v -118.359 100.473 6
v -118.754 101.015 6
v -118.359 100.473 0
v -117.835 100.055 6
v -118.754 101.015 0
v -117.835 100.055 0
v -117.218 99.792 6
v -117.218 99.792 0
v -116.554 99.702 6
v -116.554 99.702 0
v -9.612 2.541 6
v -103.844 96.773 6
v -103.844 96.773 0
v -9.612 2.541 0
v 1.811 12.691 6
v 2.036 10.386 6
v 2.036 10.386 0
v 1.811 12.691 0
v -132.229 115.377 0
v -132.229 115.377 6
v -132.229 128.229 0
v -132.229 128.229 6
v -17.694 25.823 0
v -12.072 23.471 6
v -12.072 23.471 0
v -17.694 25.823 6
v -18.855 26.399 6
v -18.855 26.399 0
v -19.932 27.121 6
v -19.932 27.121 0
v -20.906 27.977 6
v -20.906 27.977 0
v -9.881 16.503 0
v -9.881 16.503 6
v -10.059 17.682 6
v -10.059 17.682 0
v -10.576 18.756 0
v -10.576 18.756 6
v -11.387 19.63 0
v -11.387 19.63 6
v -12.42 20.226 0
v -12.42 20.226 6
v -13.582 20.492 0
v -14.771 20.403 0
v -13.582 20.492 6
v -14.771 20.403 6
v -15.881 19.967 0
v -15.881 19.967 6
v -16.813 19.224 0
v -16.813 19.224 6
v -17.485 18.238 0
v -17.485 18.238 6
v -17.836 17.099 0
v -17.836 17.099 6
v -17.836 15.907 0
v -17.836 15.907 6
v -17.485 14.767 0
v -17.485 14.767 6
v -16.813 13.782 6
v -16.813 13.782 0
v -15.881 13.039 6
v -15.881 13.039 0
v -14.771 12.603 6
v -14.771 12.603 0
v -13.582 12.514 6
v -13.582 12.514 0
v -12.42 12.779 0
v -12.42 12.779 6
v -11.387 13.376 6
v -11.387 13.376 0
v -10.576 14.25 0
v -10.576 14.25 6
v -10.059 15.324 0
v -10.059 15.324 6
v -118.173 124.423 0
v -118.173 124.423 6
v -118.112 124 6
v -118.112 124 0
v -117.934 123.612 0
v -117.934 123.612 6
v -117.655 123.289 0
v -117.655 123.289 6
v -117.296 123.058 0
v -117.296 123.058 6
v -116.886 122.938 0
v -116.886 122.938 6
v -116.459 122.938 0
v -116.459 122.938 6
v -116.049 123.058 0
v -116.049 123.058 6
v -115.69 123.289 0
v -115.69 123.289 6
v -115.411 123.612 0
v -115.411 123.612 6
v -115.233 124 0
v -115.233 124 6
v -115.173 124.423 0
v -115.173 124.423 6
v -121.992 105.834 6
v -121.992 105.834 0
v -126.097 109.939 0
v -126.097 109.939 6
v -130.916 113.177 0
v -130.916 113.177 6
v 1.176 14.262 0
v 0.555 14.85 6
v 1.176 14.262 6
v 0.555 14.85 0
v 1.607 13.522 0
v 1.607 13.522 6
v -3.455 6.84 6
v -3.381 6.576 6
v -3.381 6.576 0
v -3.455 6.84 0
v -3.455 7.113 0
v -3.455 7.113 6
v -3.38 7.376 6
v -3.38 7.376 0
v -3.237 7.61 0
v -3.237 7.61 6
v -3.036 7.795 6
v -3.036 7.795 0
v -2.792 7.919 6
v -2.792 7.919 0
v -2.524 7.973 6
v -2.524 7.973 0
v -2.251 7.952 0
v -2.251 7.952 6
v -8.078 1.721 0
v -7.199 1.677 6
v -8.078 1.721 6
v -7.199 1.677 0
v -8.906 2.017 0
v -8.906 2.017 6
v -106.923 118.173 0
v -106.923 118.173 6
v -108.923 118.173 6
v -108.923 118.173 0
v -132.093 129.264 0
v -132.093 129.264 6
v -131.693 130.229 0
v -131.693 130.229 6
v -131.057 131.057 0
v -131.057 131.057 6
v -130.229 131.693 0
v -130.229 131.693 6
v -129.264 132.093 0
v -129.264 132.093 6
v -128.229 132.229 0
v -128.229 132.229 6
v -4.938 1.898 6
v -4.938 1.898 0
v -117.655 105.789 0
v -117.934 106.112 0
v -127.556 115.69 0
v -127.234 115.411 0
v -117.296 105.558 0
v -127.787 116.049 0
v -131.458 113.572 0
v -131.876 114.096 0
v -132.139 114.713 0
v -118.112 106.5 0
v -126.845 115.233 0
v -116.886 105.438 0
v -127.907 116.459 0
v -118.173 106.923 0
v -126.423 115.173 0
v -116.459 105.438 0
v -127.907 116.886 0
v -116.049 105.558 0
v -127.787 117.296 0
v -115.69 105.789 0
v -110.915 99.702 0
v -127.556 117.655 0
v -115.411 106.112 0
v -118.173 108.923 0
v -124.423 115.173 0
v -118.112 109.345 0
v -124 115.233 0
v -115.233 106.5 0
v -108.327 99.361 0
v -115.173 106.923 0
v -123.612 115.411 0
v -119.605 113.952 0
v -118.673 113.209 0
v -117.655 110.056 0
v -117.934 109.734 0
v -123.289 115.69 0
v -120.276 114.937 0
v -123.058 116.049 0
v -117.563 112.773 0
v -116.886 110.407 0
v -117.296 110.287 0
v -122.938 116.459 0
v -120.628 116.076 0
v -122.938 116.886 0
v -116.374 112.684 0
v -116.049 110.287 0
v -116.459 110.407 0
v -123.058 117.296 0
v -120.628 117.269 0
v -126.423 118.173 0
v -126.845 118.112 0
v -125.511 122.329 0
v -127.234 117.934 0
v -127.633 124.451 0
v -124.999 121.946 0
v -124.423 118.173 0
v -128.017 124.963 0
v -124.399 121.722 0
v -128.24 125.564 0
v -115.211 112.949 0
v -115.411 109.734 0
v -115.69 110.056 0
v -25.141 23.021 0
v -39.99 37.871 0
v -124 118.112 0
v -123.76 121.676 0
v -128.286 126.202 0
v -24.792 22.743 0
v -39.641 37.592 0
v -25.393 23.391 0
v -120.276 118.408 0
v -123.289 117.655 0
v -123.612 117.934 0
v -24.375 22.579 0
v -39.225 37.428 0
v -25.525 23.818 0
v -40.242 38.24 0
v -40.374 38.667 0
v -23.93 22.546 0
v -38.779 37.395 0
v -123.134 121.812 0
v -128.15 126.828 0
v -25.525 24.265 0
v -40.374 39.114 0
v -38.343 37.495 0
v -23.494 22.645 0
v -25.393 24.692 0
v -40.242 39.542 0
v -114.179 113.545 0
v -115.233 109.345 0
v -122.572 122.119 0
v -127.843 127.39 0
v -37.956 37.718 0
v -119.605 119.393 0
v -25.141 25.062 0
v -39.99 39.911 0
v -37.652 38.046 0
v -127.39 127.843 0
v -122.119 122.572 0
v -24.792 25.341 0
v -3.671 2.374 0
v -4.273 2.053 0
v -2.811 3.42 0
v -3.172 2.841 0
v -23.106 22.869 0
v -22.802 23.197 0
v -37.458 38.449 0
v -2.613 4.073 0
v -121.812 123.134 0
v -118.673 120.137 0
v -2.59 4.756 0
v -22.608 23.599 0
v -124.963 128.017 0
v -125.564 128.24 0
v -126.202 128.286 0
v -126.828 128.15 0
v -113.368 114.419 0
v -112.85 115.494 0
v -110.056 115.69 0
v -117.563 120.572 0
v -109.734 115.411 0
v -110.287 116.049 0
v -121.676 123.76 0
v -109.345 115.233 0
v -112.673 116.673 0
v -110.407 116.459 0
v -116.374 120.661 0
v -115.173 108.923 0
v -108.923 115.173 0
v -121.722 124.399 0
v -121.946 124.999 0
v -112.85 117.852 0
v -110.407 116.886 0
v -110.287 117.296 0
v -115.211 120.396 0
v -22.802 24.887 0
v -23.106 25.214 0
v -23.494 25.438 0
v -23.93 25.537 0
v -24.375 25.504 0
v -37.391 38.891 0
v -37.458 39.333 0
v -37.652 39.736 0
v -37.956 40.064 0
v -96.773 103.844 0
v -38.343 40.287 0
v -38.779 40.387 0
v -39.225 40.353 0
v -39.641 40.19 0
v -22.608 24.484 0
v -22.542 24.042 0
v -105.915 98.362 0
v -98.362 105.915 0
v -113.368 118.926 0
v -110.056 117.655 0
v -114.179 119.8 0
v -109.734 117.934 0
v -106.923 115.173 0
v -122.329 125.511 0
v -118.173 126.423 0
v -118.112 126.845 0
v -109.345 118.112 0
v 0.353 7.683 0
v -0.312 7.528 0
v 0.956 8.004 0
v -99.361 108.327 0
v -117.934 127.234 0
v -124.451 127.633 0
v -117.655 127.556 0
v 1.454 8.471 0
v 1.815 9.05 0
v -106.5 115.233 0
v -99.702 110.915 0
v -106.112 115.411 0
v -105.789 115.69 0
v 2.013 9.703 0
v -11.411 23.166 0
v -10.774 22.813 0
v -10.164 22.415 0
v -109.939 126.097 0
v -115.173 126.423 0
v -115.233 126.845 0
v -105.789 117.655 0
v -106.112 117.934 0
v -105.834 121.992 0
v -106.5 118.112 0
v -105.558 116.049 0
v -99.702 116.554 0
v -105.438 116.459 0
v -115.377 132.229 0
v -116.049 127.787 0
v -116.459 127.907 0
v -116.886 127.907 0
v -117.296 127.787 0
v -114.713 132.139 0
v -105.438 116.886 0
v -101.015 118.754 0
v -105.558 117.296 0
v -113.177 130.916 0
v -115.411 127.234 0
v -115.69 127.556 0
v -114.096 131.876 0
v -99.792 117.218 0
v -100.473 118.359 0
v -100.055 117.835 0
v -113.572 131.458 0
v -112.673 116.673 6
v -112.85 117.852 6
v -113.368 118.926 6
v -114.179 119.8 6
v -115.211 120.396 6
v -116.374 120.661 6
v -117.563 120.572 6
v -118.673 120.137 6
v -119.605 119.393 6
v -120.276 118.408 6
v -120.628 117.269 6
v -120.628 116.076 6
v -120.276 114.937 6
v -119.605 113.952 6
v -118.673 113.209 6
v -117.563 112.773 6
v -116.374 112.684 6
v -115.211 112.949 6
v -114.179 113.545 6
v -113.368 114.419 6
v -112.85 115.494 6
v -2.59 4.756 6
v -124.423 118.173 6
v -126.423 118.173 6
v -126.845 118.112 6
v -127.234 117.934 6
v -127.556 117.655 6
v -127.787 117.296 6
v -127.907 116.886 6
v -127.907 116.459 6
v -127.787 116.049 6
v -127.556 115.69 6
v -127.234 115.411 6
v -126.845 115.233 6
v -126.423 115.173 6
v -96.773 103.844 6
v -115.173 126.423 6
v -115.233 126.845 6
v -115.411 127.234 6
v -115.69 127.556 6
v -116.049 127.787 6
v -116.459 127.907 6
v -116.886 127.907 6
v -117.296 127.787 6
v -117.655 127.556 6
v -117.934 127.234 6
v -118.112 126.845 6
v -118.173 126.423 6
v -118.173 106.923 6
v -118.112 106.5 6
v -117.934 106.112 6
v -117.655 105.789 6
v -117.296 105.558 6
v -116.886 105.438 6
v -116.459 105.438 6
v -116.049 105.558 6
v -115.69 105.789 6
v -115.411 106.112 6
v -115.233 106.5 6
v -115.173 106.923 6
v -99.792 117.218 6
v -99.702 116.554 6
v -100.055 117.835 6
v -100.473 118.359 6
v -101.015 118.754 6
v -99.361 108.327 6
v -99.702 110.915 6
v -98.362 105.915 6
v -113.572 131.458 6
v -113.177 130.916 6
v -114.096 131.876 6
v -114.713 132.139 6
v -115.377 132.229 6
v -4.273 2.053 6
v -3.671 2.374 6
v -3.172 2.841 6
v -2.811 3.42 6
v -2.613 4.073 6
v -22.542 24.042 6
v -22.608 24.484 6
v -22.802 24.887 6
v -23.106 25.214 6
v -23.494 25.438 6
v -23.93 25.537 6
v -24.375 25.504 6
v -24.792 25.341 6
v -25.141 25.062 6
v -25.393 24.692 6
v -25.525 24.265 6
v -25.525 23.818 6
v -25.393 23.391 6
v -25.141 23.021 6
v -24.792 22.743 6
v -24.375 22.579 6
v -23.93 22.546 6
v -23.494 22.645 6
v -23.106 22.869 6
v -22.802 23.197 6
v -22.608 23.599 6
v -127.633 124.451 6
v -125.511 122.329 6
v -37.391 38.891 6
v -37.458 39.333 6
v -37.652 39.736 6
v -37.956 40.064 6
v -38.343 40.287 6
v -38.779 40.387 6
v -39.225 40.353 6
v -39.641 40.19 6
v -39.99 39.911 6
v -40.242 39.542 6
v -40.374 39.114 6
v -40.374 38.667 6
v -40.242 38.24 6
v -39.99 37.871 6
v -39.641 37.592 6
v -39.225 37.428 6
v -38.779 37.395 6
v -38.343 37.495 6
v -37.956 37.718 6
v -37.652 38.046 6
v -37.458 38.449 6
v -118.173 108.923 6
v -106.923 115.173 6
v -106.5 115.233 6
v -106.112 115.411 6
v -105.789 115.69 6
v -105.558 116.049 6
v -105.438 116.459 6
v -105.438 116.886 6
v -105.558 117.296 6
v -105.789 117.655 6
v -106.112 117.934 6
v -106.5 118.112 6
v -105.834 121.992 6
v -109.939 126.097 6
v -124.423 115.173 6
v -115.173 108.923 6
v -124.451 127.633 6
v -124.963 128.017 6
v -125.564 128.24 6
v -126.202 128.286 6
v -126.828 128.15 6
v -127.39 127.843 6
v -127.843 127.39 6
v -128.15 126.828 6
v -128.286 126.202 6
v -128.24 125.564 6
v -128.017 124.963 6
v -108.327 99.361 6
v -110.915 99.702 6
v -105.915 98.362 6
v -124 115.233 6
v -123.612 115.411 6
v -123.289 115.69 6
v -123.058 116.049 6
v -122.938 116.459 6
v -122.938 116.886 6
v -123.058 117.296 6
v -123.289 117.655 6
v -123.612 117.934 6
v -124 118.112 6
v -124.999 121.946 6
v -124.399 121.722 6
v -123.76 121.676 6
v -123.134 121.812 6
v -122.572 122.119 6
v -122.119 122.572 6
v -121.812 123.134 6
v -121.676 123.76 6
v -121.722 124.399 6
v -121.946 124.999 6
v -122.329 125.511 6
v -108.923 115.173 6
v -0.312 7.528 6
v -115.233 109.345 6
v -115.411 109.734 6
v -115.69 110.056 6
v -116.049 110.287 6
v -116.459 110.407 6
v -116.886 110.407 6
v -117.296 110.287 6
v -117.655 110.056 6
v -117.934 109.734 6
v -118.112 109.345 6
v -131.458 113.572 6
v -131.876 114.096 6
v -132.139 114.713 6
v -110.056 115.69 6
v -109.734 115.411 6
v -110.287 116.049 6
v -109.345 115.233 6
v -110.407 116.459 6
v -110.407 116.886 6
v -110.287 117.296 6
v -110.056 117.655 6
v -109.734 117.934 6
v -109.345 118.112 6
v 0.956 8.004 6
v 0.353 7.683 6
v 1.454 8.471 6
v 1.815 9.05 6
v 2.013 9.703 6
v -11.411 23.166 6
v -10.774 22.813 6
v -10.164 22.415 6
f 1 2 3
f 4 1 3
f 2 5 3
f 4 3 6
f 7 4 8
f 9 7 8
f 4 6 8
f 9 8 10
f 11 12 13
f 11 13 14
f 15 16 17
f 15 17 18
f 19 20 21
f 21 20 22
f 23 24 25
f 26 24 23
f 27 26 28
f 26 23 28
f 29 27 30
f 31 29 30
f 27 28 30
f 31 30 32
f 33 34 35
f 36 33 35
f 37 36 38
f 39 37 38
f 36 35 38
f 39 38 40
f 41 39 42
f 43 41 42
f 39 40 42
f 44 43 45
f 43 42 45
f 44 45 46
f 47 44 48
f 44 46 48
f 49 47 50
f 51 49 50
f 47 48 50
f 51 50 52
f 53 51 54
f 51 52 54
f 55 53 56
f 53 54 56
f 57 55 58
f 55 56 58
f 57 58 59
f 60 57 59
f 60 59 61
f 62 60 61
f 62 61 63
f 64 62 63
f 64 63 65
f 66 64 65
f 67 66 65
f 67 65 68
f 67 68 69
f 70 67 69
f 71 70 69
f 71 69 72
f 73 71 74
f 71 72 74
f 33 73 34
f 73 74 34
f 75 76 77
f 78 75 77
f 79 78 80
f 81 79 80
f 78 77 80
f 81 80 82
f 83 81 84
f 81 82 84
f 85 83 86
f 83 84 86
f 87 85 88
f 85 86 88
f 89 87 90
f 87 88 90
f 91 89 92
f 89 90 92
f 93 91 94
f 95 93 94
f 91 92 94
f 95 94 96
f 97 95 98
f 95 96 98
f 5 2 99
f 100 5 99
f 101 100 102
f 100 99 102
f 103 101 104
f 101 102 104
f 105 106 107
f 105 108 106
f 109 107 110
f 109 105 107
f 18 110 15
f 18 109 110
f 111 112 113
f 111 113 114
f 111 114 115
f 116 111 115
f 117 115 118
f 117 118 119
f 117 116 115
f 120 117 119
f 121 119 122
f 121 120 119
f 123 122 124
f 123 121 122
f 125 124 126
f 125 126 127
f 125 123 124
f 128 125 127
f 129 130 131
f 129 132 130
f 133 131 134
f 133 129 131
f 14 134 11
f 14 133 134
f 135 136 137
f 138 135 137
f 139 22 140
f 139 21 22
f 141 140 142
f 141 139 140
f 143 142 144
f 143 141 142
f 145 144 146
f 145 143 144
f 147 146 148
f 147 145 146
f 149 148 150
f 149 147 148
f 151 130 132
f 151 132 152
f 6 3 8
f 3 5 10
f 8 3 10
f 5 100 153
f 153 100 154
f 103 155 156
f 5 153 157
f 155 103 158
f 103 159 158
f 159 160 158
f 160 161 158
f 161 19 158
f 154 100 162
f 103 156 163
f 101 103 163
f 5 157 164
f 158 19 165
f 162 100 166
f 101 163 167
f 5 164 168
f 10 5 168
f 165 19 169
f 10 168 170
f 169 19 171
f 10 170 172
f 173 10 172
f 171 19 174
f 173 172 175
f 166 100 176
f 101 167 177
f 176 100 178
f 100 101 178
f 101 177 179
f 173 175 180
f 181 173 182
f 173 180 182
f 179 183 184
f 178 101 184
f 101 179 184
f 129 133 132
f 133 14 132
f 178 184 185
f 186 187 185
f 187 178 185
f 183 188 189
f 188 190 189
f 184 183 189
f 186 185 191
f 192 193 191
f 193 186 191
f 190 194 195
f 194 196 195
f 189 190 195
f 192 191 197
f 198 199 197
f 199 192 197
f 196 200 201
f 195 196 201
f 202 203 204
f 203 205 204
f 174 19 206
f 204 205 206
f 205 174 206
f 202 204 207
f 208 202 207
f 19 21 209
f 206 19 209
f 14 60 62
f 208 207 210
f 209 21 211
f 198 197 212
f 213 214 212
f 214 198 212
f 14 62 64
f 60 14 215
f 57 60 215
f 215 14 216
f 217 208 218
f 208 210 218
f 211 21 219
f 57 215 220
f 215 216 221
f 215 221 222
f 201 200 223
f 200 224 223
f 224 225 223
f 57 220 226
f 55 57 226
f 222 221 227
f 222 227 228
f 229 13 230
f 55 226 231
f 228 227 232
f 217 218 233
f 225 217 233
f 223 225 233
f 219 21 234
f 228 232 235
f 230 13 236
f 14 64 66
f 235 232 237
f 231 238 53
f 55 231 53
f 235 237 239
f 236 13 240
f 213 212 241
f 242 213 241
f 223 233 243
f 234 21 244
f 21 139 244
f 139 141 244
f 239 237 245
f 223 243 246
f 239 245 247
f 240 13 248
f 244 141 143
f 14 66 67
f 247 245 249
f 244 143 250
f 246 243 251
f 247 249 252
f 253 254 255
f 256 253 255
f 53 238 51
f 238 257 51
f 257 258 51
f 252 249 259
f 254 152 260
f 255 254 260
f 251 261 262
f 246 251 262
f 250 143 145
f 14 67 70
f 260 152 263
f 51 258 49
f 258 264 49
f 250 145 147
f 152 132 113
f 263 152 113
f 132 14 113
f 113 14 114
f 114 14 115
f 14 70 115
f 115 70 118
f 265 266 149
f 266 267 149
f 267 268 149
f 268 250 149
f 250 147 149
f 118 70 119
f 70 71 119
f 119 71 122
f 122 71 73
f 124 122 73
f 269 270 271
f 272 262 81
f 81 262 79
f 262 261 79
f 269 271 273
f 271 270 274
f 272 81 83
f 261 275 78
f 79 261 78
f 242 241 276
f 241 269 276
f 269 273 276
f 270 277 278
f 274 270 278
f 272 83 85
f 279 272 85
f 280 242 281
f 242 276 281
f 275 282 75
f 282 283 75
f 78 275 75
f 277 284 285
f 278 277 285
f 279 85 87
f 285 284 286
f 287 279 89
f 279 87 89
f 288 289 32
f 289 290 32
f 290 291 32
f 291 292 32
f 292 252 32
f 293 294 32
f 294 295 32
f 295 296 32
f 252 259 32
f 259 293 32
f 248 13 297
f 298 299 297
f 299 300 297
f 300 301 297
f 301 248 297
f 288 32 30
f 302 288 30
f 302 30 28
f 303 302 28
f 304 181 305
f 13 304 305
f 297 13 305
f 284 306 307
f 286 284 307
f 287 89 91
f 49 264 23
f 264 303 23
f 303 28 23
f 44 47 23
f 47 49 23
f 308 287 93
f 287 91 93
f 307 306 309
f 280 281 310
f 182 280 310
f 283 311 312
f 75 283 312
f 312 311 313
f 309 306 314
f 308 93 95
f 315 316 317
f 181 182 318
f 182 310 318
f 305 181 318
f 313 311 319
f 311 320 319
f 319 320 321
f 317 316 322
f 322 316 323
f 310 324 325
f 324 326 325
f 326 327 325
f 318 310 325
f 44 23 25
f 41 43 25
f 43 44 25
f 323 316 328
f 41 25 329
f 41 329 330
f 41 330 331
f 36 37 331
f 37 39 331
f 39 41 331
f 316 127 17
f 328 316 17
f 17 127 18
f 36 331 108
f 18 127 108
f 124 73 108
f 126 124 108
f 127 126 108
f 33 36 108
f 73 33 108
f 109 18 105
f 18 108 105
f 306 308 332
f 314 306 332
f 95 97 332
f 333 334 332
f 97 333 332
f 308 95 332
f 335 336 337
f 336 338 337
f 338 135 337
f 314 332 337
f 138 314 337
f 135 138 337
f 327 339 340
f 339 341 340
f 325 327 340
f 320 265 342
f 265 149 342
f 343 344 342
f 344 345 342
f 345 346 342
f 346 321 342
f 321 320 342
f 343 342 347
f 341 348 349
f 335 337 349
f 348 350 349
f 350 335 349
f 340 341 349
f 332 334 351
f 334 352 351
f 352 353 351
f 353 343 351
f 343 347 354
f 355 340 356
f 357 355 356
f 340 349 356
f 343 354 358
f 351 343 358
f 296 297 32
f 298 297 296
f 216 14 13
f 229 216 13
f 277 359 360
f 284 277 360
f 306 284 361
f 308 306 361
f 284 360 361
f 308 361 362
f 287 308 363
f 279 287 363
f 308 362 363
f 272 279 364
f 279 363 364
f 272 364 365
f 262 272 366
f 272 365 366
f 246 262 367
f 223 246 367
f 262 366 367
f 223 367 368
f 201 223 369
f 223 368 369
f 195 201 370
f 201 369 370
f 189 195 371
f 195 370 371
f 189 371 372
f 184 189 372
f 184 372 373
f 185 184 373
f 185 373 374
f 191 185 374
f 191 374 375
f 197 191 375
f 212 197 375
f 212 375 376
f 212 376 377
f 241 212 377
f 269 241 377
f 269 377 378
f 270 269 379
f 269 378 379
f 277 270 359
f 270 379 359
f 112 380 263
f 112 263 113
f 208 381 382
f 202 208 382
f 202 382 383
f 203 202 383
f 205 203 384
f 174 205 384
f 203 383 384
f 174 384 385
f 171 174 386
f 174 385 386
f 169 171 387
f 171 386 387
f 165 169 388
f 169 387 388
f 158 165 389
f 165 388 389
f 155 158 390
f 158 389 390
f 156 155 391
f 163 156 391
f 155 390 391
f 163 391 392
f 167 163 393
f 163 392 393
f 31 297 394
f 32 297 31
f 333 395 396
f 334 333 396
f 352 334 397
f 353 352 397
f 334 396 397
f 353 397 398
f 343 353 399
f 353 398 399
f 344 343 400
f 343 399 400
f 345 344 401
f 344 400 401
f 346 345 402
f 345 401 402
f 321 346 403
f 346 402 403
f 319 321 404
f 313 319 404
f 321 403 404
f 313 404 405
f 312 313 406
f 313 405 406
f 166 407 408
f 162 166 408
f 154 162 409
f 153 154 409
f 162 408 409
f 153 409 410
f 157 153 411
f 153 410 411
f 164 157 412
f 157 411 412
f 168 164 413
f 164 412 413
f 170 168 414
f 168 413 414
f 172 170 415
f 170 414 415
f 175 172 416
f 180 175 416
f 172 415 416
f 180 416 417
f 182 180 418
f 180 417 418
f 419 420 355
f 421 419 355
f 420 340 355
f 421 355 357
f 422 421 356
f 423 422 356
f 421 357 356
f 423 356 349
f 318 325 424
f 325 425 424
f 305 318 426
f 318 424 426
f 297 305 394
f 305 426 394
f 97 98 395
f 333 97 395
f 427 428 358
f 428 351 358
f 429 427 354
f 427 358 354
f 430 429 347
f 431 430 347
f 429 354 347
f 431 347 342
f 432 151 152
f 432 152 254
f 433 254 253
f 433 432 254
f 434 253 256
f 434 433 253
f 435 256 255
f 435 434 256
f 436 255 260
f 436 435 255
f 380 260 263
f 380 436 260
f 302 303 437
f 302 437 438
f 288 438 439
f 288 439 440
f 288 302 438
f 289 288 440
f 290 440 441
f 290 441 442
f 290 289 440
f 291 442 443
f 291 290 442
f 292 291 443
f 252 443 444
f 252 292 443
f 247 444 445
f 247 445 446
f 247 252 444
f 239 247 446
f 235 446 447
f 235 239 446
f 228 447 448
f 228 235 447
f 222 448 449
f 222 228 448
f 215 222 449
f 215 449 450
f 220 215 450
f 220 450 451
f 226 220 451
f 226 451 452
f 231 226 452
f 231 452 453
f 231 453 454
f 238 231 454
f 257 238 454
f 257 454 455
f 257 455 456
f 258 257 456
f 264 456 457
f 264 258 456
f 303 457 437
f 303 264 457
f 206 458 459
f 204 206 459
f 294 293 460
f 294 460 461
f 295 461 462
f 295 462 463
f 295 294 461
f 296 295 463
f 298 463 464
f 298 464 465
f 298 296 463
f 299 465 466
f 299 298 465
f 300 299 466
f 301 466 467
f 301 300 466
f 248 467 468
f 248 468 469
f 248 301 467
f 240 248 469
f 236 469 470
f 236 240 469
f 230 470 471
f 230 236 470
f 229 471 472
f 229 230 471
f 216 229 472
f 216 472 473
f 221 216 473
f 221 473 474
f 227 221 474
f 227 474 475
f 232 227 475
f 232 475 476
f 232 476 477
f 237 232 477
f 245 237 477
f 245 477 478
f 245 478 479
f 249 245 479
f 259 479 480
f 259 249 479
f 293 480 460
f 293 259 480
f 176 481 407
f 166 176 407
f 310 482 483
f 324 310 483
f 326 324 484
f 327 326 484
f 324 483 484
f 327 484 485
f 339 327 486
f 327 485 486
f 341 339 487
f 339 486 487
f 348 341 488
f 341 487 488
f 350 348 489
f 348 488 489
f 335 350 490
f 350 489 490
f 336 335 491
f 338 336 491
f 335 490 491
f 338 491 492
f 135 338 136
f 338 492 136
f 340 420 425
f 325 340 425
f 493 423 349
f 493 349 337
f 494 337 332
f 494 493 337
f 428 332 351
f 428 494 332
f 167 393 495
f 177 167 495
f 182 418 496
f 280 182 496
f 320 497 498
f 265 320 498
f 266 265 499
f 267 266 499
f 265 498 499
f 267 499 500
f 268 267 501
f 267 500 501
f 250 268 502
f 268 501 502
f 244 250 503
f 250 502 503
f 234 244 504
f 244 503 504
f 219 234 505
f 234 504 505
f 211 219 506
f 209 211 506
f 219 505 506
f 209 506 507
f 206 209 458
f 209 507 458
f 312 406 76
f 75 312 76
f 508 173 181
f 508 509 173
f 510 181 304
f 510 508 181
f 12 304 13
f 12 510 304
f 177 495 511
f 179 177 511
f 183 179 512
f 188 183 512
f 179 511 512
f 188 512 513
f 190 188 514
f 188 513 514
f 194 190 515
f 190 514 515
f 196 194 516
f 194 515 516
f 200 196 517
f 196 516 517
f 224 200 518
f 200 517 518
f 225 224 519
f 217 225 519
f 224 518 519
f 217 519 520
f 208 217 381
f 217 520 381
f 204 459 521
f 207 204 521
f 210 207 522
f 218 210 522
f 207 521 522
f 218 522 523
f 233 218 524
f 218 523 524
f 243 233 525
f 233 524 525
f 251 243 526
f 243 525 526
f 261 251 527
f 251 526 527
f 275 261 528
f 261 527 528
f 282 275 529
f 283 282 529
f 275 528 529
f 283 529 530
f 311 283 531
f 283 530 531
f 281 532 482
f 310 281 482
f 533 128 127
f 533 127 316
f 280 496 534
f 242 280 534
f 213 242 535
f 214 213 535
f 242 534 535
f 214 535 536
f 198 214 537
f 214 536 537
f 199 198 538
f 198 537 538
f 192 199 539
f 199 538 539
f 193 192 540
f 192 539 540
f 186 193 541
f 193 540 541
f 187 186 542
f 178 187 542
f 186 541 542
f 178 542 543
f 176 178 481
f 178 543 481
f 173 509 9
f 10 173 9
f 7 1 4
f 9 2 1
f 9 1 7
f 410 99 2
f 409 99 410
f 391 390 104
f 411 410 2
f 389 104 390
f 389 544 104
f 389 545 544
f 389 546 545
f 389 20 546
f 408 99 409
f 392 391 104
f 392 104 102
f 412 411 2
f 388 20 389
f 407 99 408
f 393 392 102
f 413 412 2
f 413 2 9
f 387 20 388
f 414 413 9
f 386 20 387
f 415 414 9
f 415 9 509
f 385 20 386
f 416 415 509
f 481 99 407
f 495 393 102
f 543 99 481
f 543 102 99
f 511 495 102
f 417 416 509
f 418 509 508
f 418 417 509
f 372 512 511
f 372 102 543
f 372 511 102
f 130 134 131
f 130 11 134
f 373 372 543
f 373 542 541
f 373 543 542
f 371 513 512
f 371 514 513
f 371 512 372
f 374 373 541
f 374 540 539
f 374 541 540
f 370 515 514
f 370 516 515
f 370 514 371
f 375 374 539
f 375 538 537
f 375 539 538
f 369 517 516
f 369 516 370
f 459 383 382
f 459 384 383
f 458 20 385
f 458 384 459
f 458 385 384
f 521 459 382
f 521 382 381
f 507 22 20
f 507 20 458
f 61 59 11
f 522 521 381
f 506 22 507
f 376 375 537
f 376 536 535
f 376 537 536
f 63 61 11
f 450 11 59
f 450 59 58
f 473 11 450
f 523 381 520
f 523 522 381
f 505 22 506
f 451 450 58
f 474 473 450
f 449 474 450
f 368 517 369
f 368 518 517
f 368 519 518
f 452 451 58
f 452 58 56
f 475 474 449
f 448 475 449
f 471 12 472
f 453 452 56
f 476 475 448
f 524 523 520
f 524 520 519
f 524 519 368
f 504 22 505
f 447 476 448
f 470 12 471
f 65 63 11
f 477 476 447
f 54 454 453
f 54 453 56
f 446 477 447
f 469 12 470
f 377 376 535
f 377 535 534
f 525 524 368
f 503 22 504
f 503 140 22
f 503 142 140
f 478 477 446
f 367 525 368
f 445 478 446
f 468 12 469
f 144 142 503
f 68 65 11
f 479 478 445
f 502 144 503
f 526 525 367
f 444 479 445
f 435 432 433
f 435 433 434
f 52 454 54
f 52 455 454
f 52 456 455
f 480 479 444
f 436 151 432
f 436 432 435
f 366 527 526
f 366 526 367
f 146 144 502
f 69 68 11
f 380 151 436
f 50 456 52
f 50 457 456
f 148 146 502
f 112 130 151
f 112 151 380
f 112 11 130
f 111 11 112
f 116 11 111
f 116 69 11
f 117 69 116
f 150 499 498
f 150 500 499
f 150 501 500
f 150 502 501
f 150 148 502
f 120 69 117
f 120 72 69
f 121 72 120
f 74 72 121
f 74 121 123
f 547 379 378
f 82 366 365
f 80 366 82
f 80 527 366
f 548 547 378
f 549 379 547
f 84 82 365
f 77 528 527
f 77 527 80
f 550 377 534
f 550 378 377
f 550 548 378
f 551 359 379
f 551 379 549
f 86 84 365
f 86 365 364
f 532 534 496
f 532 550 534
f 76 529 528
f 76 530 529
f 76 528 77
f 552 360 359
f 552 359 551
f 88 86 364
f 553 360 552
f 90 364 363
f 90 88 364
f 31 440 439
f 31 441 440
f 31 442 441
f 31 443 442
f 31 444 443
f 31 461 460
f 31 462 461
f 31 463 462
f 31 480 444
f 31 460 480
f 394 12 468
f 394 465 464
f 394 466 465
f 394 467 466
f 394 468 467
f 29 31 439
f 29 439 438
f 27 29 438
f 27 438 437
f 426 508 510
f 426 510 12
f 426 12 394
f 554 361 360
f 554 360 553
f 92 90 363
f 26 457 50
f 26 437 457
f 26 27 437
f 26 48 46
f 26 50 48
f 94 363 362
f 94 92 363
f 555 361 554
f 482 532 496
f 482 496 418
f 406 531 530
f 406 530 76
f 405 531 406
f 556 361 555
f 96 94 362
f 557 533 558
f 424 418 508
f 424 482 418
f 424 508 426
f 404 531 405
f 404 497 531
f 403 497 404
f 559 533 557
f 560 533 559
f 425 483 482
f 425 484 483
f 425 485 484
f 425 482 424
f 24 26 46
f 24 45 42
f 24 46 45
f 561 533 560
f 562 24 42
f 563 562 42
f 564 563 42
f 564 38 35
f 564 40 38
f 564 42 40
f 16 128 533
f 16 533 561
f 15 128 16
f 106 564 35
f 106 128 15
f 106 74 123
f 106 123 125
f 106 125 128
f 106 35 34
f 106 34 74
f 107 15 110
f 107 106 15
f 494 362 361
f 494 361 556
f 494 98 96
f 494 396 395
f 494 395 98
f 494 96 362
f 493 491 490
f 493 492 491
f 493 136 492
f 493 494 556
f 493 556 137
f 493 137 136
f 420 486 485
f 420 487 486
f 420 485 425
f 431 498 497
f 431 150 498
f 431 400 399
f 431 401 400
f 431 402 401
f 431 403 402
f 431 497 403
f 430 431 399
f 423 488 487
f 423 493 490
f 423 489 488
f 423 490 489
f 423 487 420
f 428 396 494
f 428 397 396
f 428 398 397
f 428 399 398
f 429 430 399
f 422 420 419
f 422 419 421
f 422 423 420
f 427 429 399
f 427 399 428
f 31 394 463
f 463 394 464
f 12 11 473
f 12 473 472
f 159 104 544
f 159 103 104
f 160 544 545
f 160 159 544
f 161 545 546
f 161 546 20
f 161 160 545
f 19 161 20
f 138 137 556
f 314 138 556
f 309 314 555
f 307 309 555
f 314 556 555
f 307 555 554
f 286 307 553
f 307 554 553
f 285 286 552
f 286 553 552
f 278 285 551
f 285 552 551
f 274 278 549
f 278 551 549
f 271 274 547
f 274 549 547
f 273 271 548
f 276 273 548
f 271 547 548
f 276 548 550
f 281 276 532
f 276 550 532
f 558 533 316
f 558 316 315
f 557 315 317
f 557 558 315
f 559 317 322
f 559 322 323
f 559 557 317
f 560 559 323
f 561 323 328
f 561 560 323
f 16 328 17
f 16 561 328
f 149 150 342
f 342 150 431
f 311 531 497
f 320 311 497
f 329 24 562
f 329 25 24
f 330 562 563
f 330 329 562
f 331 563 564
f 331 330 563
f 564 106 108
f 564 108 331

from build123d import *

# Parameters (mm, degrees)
CROQUIS1_R              = 1.5
CROQUIS1_R_2            = 4
SALIENTE_EXTRUIR1_DEPTH = 6
CROQUIS4_R              = 4
SALIENTE_EXTRUIR3_DEPTH = 6
CORTAR_EXTRUIR1_DEPTH   = 6
REDONDEO3_R             = 4
CORTAR_EXTRUIR2_DEPTH   = 6
REDONDEO4_R             = 2.5
REDONDEO6_R             = 10
CORTAR_EXTRUIR3_START   = -6
CROQUIS9_R              = 4
CORTAR_EXTRUIR3_DEPTH   = 6
CROQUIS15_R             = 4
SALIENTE_EXTRUIR4_DEPTH = 6
REDONDEO12_R            = 10
REDONDEO13_R            = 3


with BuildPart() as part:
    # Croquis1 → Saliente-Extruir1 (new body)
    with BuildSketch(Plane.XY):
        with BuildLine():
            Line((-17.112213819, 2.294275414), (-30.516043414, 23.123582692))
            ThreePointArc((-30.516043414, 23.123582692), (-31.14080226, 23.989156666), (-31.854269143, 24.783201331))
            Line((-31.854269143, 24.783201331), (-45.961940777, 38.890872965))
            Line((-45.961940777, 38.890872965), (-106.773123959, 99.702056147))
            Line((-106.773123959, 99.702056147), (-99.702056147, 106.773123959))
            Line((-99.702056147, 106.773123959), (-38.890872965, 45.961940777))
            Line((-38.890872965, 45.961940777), (-24.783201331, 31.854269143))
            ThreePointArc((-24.783201331, 31.854269143), (-23.989156666, 31.14080226), (-23.123582692, 30.516043414))
            Line((-23.123582692, 30.516043414), (-2.294275414, 17.112213819))
            ThreePointArc((-2.294275414, 17.112213819), (-0.610887166, 15.302496804), (0, 12.907567049))
            Line((0, 12.907567049), (0, 7.055686841))
            ThreePointArc((0, 7.055686841), (-0.823113423, 5.438609853), (-2.614937985, 5.15257064))
            Line((-2.614937985, 5.15257064), (-4.503911831, 5.762938925))
            ThreePointArc((-4.503911831, 5.762938925), (-5.518487605, 5.518487605), (-5.762938925, 4.503911831))
            Line((-5.762938925, 4.503911831), (-5.15257064, 2.614937985))
            ThreePointArc((-5.15257064, 2.614937985), (-5.438609853, 0.823113423), (-7.055686841, 0))
            Line((-7.055686841, 0), (-12.907567049, 0))
            ThreePointArc((-12.907567049, 0), (-15.302496804, 0.610887166), (-17.112213819, 2.294275414))
        make_face()
        with Locations((-38.890872965, 38.890872965)):
            Circle(CROQUIS1_R, mode=Mode.SUBTRACT)
        with Locations((-24.04163056, 24.04163056)):
            Circle(CROQUIS1_R, mode=Mode.SUBTRACT)
        with Locations((-15.25, 15.25)):
            Circle(CROQUIS1_R_2, mode=Mode.SUBTRACT)
    extrude(amount=SALIENTE_EXTRUIR1_DEPTH)

    # Croquis4 → Saliente-Extruir3 (add)
    with BuildSketch(Plane.XY.offset(6)):
        Polygon((-106.773123959, 99.702056147), (-118.086832458, 99.702056147), (-132.228968082, 113.844191771), (-132.228968082, 132.228968082), (-113.844191771, 132.228968082), (-99.702056147, 118.086832458), (-99.702056147, 106.773123959), align=None)
        with Locations((-116.672618896, 116.672618896)):
            Circle(CROQUIS4_R, mode=Mode.SUBTRACT)
    extrude(amount=-SALIENTE_EXTRUIR3_DEPTH)

    # Croquis5 → Cortar-Extruir1 (cut)
    with BuildSketch(Plane.XY.offset(6)):
        with BuildLine():
            Line((-127.632774004, 124.450793489), (-125.511453661, 122.329473145))
            ThreePointArc((-125.511453661, 122.329473145), (-122.329473145, 122.329473145), (-122.329473145, 125.511453661))
            Line((-122.329473145, 125.511453661), (-124.450793489, 127.632774004))
            ThreePointArc((-124.450793489, 127.632774004), (-127.632774004, 127.632774004), (-127.632774004, 124.450793489))
        make_face()
        with BuildLine():
            Line((-118.172618896, 108.922618896), (-118.172618896, 106.922618896))
            ThreePointArc((-118.172618896, 106.922618896), (-116.672618896, 105.422618896), (-115.172618896, 106.922618896))
            Line((-115.172618896, 106.922618896), (-115.172618896, 108.922618896))
            ThreePointArc((-115.172618896, 108.922618896), (-116.672618896, 110.422618896), (-118.172618896, 108.922618896))
        make_face()
        with BuildLine():
            Line((-108.922618896, 115.172618896), (-106.922618896, 115.172618896))
            ThreePointArc((-106.922618896, 115.172618896), (-105.422618896, 116.672618896), (-106.922618896, 118.172618896))
            Line((-106.922618896, 118.172618896), (-108.922618896, 118.172618896))
            ThreePointArc((-108.922618896, 118.172618896), (-110.422618896, 116.672618896), (-108.922618896, 115.172618896))
        make_face()
        with BuildLine():
            Line((-124.422618896, 118.172618896), (-126.422618896, 118.172618896))
            ThreePointArc((-126.422618896, 118.172618896), (-127.922618896, 116.672618896), (-126.422618896, 115.172618896))
            Line((-126.422618896, 115.172618896), (-124.422618896, 115.172618896))
            ThreePointArc((-124.422618896, 115.172618896), (-122.922618896, 116.672618896), (-124.422618896, 118.172618896))
        make_face()
        with BuildLine():
            Line((-115.172618896, 124.422618896), (-115.172618896, 126.422618896))
            ThreePointArc((-115.172618896, 126.422618896), (-116.672618896, 127.922618896), (-118.172618896, 126.422618896))
            Line((-118.172618896, 126.422618896), (-118.172618896, 124.422618896))
            ThreePointArc((-118.172618896, 124.422618896), (-116.672618896, 122.922618896), (-115.172618896, 124.422618896))
        make_face()
    extrude(amount=-CORTAR_EXTRUIR1_DEPTH, mode=Mode.SUBTRACT)

    # Redondeo3
    redondeo3_edges = [part.edges().sort_by_distance(p)[0] for p in [
        (-132.228968082, 132.228968082, 3),
    ]]
    fillet(redondeo3_edges, radius=REDONDEO3_R)

    # Croquis7 → Cortar-Extruir2 (cut)
    with BuildSketch(Plane.XY.offset(6)):
        with BuildLine():
            Line((-132.228968082, 113.844191771), (-118.086832458, 99.702056147))
            ThreePointArc((-118.086832458, 99.702056147), (-123.944696834, 107.986327395), (-132.228968082, 113.844191771))
        make_face()
        with BuildLine():
            Line((-113.844191771, 132.228968082), (-99.702056147, 118.086832458))
            ThreePointArc((-99.702056147, 118.086832458), (-107.986327395, 123.944696834), (-113.844191771, 132.228968082))
        make_face()
    extrude(amount=-CORTAR_EXTRUIR2_DEPTH, mode=Mode.SUBTRACT)

    # Redondeo4
    redondeo4_edges = [part.edges().sort_by_distance(p)[0] for p in [
        (-118.086832458, 99.702056147, 3),
        (-132.228968082, 113.844191771, 3),
        (-113.844191771, 132.228968082, 3),
        (-99.702056147, 118.086832458, 3),
    ]]
    fillet(redondeo4_edges, radius=REDONDEO4_R)

    # Redondeo6
    redondeo6_edges = [part.edges().sort_by_distance(p)[0] for p in [
        (-106.773123959, 99.702056147, 3),
        (-99.702056147, 106.773123959, 3),
    ]]
    fillet(redondeo6_edges, radius=REDONDEO6_R)

    # Croquis9 → Cortar-Extruir3 (cut)
    with BuildSketch(Plane.XY.offset(6).offset(CORTAR_EXTRUIR3_START)):
        with BuildLine():
            Line((-23.047623594, 15.976555782), (-31.854269143, 24.783201331))
            ThreePointArc((-31.854269143, 24.783201331), (-31.14080226, 23.989156666), (-30.516043414, 23.123582692))
            Line((-30.516043414, 23.123582692), (-17.112213819, 2.294275414))
            ThreePointArc((-17.112213819, 2.294275414), (-15.302496804, 0.610887166), (-12.907567049, 0))
            Line((-12.907567049, 0), (-7.055686841, 0))
            ThreePointArc((-7.055686841, 0), (-5.438609853, 0.823113423), (-5.15257064, 2.614937985))
            Line((-5.15257064, 2.614937985), (-5.762938925, 4.503911831))
            ThreePointArc((-5.762938925, 4.503911831), (-5.518487605, 5.518487605), (-4.503911831, 5.762938925))
            Line((-4.503911831, 5.762938925), (-2.614937985, 5.15257064))
            ThreePointArc((-2.614937985, 5.15257064), (-0.823113423, 5.438609853), (0, 7.055686841))
            Line((0, 7.055686841), (0, 12.907567049))
            ThreePointArc((0, 12.907567049), (-0.610887166, 15.302496804), (-2.294275414, 17.112213819))
            Line((-2.294275414, 17.112213819), (-23.123582692, 30.516043414))
            ThreePointArc((-23.123582692, 30.516043414), (-23.989156666, 31.14080226), (-24.783201331, 31.854269143))
            Line((-24.783201331, 31.854269143), (-15.976555782, 23.047623594))
            Line((-15.976555782, 23.047623594), (-23.047623594, 15.976555782))
        make_face()
        with Locations((-15.25, 15.25)):
            Circle(CROQUIS9_R, mode=Mode.SUBTRACT)
    extrude(amount=CORTAR_EXTRUIR3_DEPTH, mode=Mode.SUBTRACT)

    # Croquis15 → Saliente-Extruir4 (add)
    with BuildSketch(Plane.XY.offset(6)):
        with BuildLine():
            Line((-19.512089688, 26.5831575), (-15.976555782, 23.047623594))
            Line((-15.976555782, 23.047623594), (-23.047623594, 15.976555782))
            Line((-23.047623594, 15.976555782), (-8.609865422, 1.53879761))
            Line((-8.609865422, 1.53879761), (-4.93762751, 1.898269736))
            ThreePointArc((-4.93762751, 1.898269736), (-3.171999371, 2.840663892), (-2.589885038, 4.755524821))
            Line((-2.589885038, 4.755524821), (-3.381380182, 6.576048667))
            ThreePointArc((-3.381380182, 6.576048667), (-3.236935195, 7.609613418), (-2.251001031, 7.95174537))
            Line((-2.251001031, 7.95174537), (-0.311548805, 7.528310963))
            ThreePointArc((-0.311548805, 7.528310963), (1.454079334, 8.470705119), (2.036193666, 10.385566048))
            Line((2.036193666, 10.385566048), (1.676721541, 14.05780396))
            Line((1.676721541, 14.05780396), (-11.059892894, 23.047623594))
            Line((-11.059892894, 23.047623594), (-19.512089688, 26.5831575))
        make_face()
        with Locations((-13.881053208, 16.502885084)):
            Circle(CROQUIS15_R, mode=Mode.SUBTRACT)
    extrude(amount=-SALIENTE_EXTRUIR4_DEPTH)

    # Redondeo12
    redondeo12_edges = [part.edges().sort_by_distance(p)[0] for p in [
        (-19.512089688, 26.5831575, 3),
        (-11.059892894, 23.047623594, 3),
    ]]
    fillet(redondeo12_edges, radius=REDONDEO12_R)

    # Redondeo13
    redondeo13_edges = [part.edges().sort_by_distance(p)[0] for p in [
        (-8.609865422, 1.53879761, 3),
        (1.676721541, 14.05780396, 3),
    ]]
    fillet(redondeo13_edges, radius=REDONDEO13_R)


solid = part.part
